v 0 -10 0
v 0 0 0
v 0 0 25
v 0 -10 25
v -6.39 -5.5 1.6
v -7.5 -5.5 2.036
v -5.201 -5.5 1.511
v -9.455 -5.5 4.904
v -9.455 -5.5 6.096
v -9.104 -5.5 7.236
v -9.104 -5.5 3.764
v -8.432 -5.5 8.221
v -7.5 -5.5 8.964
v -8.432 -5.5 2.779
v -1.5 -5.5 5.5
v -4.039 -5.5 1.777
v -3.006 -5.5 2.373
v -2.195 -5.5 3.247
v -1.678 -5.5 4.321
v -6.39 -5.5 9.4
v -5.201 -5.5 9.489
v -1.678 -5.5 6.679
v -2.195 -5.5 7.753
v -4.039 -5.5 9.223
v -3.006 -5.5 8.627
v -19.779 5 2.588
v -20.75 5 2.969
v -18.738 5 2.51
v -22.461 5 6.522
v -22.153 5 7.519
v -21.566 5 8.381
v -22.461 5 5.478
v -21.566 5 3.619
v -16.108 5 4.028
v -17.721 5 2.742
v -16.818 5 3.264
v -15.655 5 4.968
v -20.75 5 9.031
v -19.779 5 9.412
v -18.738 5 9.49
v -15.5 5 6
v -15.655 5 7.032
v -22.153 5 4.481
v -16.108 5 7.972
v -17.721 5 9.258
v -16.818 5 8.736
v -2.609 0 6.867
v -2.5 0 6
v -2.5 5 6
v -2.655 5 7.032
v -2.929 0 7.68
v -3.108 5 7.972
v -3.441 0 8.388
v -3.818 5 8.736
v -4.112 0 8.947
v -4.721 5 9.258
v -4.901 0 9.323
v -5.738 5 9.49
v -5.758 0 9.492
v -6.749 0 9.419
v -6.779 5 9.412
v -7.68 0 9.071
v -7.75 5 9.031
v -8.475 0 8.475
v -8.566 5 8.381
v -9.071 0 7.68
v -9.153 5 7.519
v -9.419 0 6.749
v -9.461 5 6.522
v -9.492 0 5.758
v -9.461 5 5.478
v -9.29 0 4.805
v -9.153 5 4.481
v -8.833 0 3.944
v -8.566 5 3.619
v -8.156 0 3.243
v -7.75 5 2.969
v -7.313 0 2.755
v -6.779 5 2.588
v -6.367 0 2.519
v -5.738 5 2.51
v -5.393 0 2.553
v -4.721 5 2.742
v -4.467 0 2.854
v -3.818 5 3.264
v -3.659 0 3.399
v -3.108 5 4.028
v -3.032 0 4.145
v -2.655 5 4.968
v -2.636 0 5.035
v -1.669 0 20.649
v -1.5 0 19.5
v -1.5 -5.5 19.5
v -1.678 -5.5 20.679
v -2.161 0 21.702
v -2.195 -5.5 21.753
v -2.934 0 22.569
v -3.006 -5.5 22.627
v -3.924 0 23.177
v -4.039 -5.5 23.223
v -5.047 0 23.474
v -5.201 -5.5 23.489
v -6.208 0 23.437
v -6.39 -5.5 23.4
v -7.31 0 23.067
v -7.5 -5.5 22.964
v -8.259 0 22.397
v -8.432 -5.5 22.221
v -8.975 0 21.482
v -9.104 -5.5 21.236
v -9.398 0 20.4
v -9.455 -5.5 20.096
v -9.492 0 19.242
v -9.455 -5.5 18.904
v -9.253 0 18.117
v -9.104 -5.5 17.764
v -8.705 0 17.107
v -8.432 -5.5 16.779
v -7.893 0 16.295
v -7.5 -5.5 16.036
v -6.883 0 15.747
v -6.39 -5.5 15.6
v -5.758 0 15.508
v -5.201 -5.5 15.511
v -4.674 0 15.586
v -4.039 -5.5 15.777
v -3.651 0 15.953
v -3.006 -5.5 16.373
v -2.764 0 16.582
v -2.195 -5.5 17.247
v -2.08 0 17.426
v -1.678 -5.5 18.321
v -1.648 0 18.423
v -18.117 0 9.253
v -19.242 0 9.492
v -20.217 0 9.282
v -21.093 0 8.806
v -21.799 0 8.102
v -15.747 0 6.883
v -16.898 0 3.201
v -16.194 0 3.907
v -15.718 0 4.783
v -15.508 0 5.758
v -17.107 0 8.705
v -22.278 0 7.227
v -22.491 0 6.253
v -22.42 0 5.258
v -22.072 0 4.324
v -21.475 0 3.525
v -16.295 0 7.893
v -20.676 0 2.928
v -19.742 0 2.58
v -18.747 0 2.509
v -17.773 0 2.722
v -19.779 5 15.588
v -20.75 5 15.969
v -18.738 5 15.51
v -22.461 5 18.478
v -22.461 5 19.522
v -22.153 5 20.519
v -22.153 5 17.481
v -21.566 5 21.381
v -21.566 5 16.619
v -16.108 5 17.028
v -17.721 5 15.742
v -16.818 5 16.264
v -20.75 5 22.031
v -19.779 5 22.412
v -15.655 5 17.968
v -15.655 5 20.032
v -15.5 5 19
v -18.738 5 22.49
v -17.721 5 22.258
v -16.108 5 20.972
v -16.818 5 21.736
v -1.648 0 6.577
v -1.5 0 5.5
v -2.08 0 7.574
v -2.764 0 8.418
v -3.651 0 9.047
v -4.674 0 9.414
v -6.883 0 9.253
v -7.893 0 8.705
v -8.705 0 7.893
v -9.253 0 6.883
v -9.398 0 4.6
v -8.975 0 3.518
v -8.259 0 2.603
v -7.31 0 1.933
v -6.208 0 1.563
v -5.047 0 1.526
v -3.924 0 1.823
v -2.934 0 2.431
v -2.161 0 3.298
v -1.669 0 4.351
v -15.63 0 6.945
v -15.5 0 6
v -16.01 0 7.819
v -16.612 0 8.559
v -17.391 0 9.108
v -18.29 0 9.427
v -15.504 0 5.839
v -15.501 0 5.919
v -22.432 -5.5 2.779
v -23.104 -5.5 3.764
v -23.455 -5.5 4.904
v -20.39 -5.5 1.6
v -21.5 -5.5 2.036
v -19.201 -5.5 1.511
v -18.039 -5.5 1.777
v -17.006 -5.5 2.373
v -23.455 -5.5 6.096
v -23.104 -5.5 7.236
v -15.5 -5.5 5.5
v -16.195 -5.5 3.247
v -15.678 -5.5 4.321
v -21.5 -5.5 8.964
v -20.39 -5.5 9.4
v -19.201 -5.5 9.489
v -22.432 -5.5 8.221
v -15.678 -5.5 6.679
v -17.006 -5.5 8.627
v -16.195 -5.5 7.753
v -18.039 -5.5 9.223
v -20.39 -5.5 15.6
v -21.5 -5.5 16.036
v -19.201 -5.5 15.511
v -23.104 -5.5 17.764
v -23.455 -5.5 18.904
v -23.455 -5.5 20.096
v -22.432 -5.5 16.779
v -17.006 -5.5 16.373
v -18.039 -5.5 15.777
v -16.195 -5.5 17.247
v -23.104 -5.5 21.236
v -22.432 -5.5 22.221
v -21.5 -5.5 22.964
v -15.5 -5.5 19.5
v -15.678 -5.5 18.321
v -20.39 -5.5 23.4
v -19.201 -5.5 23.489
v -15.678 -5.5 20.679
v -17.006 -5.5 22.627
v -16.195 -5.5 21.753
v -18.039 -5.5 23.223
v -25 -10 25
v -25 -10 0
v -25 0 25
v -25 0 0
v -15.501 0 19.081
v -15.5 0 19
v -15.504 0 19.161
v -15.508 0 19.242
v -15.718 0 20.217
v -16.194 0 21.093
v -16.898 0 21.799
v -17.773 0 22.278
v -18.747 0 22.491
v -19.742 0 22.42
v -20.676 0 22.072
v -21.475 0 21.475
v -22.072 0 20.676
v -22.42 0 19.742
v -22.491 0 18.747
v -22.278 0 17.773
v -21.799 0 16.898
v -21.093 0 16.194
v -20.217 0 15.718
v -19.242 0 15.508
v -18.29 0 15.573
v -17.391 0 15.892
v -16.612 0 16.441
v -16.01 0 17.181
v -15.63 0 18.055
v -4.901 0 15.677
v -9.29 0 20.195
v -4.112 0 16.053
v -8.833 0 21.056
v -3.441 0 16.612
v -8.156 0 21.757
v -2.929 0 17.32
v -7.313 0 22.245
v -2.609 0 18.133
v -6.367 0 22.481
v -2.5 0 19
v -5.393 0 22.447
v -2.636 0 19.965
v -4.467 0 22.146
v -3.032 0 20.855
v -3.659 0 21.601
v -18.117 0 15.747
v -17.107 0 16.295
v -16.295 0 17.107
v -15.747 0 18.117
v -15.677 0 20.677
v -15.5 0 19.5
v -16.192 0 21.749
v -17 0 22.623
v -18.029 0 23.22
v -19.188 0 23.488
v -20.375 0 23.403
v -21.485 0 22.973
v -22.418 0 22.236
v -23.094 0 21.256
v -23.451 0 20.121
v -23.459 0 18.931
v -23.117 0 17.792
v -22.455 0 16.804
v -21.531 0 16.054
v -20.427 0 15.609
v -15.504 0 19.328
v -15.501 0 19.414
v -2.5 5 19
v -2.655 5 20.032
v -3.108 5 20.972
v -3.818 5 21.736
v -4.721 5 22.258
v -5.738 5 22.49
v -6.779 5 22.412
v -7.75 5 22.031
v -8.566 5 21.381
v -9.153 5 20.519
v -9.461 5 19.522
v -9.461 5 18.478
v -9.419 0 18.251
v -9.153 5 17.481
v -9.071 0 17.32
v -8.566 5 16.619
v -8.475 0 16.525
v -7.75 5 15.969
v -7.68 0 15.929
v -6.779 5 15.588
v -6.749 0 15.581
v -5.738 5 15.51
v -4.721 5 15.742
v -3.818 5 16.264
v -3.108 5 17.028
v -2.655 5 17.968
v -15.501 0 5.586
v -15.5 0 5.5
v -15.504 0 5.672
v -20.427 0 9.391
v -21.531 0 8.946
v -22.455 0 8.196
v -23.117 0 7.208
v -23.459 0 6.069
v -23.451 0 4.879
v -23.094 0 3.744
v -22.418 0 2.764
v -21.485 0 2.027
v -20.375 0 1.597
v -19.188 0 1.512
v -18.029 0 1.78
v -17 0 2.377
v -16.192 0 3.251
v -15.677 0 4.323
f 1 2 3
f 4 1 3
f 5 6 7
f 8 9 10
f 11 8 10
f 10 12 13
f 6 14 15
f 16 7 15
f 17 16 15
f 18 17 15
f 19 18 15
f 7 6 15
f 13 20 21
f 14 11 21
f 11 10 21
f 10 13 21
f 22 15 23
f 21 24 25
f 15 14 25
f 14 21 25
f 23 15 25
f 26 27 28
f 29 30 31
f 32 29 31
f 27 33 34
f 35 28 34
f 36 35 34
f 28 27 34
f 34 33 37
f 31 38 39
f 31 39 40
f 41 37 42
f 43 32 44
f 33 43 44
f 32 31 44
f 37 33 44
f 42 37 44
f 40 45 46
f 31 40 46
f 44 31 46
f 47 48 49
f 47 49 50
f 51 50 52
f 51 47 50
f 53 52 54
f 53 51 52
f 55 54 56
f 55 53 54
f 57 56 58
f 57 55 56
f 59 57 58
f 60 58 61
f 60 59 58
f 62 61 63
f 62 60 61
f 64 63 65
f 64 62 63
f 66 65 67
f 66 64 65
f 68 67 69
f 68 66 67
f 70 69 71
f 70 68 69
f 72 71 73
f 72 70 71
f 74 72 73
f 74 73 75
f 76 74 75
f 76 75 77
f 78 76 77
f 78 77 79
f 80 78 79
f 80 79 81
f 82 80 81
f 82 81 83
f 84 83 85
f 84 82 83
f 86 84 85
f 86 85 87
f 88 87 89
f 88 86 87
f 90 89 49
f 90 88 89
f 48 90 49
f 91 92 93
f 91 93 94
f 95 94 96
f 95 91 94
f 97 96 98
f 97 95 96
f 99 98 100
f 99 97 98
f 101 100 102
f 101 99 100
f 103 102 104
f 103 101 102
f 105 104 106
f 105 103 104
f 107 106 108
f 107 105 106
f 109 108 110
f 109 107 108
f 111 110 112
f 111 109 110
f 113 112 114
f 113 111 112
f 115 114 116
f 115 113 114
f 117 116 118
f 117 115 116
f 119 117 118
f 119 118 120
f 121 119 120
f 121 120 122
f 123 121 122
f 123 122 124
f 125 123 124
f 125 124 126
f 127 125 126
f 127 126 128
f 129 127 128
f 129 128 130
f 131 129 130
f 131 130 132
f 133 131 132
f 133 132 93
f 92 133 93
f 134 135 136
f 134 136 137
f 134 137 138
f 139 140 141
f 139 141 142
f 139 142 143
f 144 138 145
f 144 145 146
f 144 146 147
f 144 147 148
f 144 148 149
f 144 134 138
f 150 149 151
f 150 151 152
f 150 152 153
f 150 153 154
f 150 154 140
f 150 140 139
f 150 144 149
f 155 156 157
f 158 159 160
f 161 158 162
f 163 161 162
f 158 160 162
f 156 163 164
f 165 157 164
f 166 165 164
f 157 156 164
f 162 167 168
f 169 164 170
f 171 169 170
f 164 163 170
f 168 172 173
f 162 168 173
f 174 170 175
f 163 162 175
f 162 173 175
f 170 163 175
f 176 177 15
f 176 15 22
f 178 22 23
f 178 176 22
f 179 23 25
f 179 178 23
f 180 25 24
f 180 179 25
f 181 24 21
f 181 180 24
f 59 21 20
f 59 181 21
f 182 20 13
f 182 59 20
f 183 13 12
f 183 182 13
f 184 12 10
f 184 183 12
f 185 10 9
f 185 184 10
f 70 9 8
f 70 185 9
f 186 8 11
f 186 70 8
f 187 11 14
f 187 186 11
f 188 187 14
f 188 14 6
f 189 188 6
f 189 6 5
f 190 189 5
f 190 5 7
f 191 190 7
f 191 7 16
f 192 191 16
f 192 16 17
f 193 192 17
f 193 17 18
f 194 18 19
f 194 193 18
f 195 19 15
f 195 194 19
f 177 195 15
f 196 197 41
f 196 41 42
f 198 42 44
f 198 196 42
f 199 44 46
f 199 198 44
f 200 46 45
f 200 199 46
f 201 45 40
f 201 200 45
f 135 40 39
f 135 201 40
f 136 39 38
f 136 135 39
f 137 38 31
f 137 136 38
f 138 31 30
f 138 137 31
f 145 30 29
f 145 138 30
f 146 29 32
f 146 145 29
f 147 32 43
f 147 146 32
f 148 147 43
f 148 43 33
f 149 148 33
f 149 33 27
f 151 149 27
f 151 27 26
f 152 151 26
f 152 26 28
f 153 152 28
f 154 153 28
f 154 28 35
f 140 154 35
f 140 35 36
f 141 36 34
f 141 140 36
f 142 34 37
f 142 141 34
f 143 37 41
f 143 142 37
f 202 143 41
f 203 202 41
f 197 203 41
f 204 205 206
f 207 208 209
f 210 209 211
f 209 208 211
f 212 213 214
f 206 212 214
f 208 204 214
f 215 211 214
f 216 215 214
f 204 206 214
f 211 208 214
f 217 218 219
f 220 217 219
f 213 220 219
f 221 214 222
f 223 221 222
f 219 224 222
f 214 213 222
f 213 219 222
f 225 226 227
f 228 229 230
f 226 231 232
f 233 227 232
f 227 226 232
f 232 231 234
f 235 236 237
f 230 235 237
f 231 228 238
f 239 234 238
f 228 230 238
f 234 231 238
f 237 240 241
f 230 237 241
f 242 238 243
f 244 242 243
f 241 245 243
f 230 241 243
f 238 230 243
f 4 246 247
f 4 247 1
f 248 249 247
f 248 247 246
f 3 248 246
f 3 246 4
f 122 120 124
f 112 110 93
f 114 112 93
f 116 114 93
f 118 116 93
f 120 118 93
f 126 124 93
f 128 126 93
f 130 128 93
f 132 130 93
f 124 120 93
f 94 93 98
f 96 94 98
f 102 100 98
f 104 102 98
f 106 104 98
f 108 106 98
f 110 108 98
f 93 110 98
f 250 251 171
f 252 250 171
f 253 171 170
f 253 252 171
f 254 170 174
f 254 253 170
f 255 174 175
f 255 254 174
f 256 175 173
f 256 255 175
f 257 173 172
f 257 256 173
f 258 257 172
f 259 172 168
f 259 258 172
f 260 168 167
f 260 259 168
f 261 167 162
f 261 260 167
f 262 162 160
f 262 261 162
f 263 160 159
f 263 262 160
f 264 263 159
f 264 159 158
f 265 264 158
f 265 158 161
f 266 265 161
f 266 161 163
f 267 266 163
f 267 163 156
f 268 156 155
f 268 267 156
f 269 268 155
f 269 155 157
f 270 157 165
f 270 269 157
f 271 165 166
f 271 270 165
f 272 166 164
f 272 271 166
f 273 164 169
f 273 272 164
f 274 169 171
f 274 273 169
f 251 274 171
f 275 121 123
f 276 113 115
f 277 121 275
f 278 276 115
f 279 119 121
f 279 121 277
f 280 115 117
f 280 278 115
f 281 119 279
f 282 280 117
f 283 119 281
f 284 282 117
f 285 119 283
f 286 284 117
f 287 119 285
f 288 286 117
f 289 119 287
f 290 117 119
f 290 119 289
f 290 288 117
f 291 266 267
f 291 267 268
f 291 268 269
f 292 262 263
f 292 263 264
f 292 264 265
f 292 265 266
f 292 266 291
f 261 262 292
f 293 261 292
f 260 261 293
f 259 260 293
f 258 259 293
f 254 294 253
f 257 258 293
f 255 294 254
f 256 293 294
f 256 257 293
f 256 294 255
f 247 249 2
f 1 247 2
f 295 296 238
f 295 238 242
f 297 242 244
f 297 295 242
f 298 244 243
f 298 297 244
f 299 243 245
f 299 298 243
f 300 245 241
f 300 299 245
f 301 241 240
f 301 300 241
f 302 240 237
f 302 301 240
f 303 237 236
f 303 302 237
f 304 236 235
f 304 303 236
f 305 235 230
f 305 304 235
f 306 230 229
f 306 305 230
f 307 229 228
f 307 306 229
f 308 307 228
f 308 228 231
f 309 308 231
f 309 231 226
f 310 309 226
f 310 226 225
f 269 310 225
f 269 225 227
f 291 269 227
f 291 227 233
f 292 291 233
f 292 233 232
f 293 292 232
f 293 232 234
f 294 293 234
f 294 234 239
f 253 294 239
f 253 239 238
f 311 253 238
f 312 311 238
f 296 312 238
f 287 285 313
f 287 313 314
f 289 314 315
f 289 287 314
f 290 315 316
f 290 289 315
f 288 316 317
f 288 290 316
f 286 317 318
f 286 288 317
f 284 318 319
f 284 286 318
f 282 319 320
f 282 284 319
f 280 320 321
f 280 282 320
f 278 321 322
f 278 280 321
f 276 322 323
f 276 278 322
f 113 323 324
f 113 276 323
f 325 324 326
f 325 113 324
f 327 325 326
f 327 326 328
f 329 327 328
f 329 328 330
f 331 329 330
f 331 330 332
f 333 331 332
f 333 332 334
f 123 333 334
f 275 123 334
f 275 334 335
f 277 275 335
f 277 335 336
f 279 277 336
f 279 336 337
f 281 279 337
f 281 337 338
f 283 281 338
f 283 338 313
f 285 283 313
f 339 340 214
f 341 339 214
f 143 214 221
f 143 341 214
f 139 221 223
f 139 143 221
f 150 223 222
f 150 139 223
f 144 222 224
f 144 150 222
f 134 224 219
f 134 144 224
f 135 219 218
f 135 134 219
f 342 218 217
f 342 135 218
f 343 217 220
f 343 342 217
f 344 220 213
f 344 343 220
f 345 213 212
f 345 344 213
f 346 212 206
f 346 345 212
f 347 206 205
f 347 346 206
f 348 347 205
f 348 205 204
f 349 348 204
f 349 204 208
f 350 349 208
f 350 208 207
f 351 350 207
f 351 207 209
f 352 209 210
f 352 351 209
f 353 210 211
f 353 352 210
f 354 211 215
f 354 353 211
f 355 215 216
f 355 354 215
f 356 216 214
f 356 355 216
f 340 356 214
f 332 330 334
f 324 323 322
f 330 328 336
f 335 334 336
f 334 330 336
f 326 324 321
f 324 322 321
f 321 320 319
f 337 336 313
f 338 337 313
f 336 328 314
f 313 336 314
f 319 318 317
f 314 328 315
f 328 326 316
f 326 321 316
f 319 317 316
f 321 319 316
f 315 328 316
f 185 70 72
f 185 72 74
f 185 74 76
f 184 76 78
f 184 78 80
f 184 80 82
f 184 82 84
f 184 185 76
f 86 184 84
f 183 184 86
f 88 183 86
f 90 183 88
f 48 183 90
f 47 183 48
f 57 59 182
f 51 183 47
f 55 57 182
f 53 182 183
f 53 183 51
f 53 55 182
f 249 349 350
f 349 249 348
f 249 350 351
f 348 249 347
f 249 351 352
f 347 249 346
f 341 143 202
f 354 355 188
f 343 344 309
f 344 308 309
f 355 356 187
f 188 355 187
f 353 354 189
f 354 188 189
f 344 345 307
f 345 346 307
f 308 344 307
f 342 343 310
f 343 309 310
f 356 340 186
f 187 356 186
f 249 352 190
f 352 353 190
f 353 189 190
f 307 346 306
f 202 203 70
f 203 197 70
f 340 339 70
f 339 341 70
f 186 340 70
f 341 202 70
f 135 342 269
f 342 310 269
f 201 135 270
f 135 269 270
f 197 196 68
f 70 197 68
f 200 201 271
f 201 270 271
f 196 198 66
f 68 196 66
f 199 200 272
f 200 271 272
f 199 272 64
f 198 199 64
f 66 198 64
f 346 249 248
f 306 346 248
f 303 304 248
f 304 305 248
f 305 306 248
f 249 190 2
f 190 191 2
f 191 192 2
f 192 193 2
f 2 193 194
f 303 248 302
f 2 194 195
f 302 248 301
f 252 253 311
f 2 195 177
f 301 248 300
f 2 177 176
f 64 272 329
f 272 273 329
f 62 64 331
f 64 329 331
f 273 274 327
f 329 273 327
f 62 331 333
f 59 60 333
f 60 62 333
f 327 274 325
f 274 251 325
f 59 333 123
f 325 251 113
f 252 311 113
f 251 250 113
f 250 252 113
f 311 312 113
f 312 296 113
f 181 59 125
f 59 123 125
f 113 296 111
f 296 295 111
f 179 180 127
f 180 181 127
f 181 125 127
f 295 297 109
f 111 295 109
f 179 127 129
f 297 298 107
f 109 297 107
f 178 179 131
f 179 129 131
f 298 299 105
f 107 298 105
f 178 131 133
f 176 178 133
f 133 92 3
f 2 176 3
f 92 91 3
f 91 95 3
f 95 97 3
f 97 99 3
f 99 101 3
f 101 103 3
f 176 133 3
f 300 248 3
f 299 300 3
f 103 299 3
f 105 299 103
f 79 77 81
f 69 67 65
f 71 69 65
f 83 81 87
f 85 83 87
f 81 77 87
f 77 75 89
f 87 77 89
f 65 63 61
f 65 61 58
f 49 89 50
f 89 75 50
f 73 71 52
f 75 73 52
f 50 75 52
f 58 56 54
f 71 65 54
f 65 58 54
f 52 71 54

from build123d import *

# Parameters (mm, degrees)
F0_W      = 25
F0_H      = 25
F1_DEPTH  = 10
F2_R      = 3.5
F3_DEPTH  = 5
F4_R      = 4
F1_FACE_W = 25
F1_FACE_H = 25
F5_DEPTH  = 5.5


with BuildPart() as f1:
    # F0 (on Front) → F1 (new body)
    with BuildSketch(Plane.XZ):
        with Locations((-12.5, 12.5)):
            Rectangle(F0_W, F0_H)
    extrude(amount=F1_DEPTH)

    # F2 (on Front) → F3 (join)
    with BuildSketch(Plane.XZ):
        with Locations((-19, 19)):
            Circle(F2_R)
        with Locations((-19, 6)):
            Circle(F2_R)
        with Locations((-6, 6)):
            Circle(F2_R)
        with Locations((-6, 19)):
            Circle(F2_R)
    extrude(amount=-F3_DEPTH)

    # F4 (on Front) + F1_face (on face) → F5 (cut)
    with BuildSketch(Plane.XZ):
        with Locations((-19.5, 19.5)):
            Circle(F4_R)
        with Locations((-19.5, 5.5)):
            Circle(F4_R)
        with Locations((-5.5, 5.5)):
            Circle(F4_R)
        with Locations((-5.5, 19.5)):
            Circle(F4_R)
    with BuildSketch(Plane(origin=(-12.5, -10, 12.5), x_dir=(1, 0, 0), z_dir=(0, -1, 0))):
        Rectangle(F1_FACE_W, F1_FACE_H)
    extrude(amount=F5_DEPTH, mode=Mode.SUBTRACT)


solid = f1.part
